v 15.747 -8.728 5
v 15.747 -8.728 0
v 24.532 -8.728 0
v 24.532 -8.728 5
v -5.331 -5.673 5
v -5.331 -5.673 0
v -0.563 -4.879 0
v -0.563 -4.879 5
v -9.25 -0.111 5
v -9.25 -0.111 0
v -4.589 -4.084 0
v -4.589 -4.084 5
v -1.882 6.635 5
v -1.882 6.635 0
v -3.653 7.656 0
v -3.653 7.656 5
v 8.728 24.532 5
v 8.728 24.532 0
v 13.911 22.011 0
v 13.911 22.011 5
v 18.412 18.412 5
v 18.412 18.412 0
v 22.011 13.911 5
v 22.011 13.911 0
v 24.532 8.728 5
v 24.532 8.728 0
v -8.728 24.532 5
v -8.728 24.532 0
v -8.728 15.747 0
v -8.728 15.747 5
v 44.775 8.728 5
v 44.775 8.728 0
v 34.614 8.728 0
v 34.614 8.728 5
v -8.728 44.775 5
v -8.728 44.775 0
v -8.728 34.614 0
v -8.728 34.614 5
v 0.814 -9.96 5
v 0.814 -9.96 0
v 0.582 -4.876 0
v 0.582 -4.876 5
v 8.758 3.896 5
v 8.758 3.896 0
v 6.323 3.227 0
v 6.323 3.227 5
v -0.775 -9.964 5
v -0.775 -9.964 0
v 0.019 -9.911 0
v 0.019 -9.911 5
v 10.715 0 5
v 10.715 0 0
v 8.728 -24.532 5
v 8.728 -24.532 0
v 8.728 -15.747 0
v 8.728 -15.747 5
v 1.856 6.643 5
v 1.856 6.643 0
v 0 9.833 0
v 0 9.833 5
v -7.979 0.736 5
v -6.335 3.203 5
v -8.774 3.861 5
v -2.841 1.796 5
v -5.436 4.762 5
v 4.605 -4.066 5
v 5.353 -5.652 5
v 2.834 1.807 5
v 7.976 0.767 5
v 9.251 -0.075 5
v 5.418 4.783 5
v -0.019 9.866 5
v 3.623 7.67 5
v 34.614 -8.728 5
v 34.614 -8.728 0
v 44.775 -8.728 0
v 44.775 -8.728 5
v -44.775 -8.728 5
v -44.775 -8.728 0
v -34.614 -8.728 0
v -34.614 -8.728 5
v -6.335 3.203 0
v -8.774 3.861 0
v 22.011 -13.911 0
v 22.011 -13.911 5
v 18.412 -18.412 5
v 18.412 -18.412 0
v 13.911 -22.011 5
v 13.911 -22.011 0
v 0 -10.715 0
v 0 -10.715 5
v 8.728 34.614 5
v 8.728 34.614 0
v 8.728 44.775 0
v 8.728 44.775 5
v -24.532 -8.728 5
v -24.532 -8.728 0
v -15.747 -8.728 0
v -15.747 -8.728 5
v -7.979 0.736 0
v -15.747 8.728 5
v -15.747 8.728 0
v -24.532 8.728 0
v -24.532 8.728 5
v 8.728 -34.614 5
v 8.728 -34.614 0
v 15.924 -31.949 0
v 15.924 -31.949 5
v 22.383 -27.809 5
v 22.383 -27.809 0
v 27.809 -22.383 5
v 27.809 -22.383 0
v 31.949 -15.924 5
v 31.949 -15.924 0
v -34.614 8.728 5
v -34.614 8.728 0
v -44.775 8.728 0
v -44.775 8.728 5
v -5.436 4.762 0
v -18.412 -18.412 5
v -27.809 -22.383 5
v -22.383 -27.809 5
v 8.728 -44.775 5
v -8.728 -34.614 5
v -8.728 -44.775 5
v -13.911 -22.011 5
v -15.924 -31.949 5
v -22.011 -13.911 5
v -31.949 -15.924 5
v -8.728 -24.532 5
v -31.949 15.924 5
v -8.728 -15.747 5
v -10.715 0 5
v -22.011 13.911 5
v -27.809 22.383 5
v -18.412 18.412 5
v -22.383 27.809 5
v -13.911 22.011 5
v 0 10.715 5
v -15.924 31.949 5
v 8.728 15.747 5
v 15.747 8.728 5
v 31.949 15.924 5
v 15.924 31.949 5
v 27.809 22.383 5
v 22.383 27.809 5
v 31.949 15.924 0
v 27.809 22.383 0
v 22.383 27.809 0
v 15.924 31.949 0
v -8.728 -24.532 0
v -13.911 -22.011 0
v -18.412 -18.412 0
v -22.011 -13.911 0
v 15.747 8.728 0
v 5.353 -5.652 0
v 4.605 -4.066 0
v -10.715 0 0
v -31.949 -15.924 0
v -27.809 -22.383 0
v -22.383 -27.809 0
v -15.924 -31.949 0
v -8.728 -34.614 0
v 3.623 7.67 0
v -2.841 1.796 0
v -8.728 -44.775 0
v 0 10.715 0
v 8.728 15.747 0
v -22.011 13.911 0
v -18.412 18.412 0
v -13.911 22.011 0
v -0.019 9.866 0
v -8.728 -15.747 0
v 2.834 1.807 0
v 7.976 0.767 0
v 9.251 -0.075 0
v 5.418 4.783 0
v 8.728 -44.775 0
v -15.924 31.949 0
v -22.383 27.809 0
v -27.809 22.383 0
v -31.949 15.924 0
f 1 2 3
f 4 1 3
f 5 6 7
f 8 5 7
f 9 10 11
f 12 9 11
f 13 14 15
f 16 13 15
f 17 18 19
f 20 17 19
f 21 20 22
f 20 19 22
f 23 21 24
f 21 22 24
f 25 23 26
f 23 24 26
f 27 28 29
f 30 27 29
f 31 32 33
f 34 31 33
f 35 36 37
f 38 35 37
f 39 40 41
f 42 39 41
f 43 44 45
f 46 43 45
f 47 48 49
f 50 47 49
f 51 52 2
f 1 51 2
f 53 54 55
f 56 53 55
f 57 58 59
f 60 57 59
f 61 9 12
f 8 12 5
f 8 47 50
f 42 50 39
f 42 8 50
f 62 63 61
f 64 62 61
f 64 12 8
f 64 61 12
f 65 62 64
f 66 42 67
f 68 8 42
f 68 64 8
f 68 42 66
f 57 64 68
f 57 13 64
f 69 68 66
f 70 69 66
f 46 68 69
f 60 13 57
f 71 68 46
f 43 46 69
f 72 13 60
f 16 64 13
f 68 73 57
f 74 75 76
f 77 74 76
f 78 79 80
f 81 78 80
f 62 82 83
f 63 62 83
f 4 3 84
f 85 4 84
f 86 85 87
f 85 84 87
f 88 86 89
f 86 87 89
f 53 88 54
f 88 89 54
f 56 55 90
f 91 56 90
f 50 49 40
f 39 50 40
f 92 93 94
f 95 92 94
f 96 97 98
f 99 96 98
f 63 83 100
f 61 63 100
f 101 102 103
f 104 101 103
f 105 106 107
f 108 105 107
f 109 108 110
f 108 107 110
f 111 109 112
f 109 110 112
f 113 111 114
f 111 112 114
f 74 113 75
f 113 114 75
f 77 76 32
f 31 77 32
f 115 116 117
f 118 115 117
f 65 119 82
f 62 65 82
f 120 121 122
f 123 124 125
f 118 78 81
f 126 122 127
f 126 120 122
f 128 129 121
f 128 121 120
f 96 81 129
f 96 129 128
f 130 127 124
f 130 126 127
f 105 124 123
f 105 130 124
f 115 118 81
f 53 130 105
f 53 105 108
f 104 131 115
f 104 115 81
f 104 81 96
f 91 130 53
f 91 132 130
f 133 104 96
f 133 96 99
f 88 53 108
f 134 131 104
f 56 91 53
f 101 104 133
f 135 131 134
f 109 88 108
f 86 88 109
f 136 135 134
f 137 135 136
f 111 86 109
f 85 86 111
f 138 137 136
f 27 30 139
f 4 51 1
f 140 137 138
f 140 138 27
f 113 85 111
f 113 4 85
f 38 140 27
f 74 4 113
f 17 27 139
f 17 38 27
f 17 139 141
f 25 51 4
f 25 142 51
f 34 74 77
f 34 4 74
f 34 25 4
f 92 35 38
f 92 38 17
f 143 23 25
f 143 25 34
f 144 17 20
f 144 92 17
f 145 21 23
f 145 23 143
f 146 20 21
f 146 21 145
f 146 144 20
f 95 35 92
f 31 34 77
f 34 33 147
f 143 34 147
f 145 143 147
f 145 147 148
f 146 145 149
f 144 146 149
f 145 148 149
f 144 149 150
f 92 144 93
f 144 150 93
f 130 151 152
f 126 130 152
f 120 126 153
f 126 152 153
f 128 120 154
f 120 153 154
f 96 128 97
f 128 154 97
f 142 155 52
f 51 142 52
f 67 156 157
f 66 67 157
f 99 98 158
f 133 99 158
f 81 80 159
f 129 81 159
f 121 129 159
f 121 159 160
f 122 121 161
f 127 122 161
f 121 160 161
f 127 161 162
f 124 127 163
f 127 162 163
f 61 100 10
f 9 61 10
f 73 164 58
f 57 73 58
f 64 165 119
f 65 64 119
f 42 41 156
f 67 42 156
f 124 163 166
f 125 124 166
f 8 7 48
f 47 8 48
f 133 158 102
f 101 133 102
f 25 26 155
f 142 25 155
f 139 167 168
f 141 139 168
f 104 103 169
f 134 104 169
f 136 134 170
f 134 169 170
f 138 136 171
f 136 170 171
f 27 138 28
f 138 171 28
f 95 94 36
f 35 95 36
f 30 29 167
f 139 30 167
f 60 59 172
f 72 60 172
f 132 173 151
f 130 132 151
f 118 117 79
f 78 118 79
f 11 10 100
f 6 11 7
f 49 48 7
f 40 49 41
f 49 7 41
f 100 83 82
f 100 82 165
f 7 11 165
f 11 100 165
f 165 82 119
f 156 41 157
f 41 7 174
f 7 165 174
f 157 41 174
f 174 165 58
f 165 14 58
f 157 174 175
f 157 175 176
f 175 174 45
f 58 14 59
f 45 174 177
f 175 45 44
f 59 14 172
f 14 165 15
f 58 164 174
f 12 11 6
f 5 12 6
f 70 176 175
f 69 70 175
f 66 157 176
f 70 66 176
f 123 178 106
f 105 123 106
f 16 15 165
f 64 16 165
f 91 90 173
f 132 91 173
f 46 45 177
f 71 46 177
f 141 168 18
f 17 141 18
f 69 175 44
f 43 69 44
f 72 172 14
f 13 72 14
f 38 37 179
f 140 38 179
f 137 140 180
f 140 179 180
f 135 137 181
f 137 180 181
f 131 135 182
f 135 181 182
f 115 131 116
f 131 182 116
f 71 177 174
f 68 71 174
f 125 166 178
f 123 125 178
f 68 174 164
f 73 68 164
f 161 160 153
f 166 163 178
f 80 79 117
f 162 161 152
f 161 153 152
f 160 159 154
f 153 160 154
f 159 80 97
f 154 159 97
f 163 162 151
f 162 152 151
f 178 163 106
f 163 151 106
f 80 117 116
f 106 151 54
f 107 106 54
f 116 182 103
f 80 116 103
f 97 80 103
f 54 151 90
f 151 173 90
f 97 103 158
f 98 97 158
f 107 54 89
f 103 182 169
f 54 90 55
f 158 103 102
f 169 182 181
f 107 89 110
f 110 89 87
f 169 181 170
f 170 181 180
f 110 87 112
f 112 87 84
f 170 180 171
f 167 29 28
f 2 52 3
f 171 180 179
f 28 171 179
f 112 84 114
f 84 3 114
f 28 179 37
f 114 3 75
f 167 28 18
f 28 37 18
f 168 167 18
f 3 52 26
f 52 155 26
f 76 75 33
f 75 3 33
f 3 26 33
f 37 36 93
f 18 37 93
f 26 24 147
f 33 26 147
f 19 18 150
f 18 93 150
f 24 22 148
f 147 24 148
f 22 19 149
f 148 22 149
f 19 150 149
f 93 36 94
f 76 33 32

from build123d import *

# Parameters (mm, degrees)
F1_DEPTH = 5


with BuildPart() as f1:
    # F0 (on Top) → F1 (new body)
    with BuildSketch(Plane.XY):
        with BuildLine():
            Line((-8.7284976617, 44.7745621204), (-8.7284976617, 34.6139920432))
            ThreePointArc((-8.7284976617, 34.6139920432), (-4.3977485861, 35.4256252446), (0, 35.6975505686))
            Line((0, 35.6975505686), (0, 44.7745621204))
            Line((0, 44.7745621204), (-8.7284976617, 44.7745621204))
        make_face()
        with BuildLine():
            Line((0, 44.7745621204), (0, 35.6975505686))
            ThreePointArc((0, 35.6975505686), (4.3977485861, 35.4256252446), (8.7284976617, 34.6139920432))
            Line((8.7284976617, 34.6139920432), (8.7284976617, 44.7745621204))
            Line((8.7284976617, 44.7745621204), (0, 44.7745621204))
        make_face()
        with BuildLine():
            ThreePointArc((8.7284976617, 34.6139920432), (4.3977485861, 35.4256252446), (0, 35.6975505686))
            Line((0, 35.6975505686), (0, 26.0385947902))
            ThreePointArc((0, 26.0385947902), (4.4287789528, 25.6591959273), (8.7284976616, 24.5320555033))
            Line((8.7284976617, 24.5320555033), (8.7284976617, 34.6139920432))
        make_face()
        with BuildLine():
            ThreePointArc((0, 35.6975505686), (-4.3977485861, 35.4256252446), (-8.7284976617, 34.6139920432))
            Line((-8.7284976617, 34.6139920432), (-8.7284976617, 24.5320555033))
            ThreePointArc((-8.7284976616, 24.5320555033), (-4.4287789528, 25.6591959273), (0, 26.0385947902))
            Line((0, 26.0385947902), (0, 35.6975505686))
        make_face()
        with BuildLine():
            ThreePointArc((0, 26.0385947902), (-4.4287789528, 25.6591959273), (-8.7284976616, 24.5320555033))
            Line((-8.7284976617, 24.5320555033), (-8.7284976617, 15.7472789288))
            Line((-8.7284976617, 15.7472789288), (0, 10.7151791453))
            Line((0, 10.7151791453), (0, 26.0385947902))
        make_face()
        with BuildLine():
            ThreePointArc((8.7284976616, 24.5320555033), (4.4287789528, 25.6591959273), (0, 26.0385947902))
            Line((0, 26.0385947902), (0, 10.7151791453))
            Line((0, 10.7151791453), (8.7284976617, 15.7472789288))
            Line((8.7284976617, 15.7472789288), (8.7284976617, 24.5320555033))
        make_face()
        with BuildLine():
            Line((15.7472789288, -8.7284976617), (24.5320555033, -8.7284976617))
            ThreePointArc((24.5320555033, -8.7284976617), (25.6591959273, -4.4287789528), (26.0385947902, 0))
            Line((26.0385947902, 0), (10.7151791453, 0))
            Line((10.7151791453, 0), (15.7472789288, -8.7284976617))
        make_face()
        with BuildLine():
            ThreePointArc((26.0385947902, 0), (25.6591959273, 4.4287789528), (24.5320555033, 8.7284976616))
            Line((24.5320555033, 8.7284976617), (15.7472789288, 8.7284976617))
            Line((15.7472789288, 8.7284976617), (10.7151791453, 0))
            Line((10.7151791453, 0), (26.0385947902, 0))
        make_face()
        with BuildLine():
            ThreePointArc((35.6975505686, 0), (35.4256252446, 4.3977485861), (34.6139920432, 8.7284976616))
            Line((34.6139920432, 8.7284976617), (24.5320555033, 8.7284976617))
            ThreePointArc((24.5320555033, 8.7284976616), (25.6591959273, 4.4287789528), (26.0385947902, 0))
            Line((26.0385947902, 0), (35.6975505686, 0))
        make_face()
        with BuildLine():
            Line((24.5320555033, -8.7284976617), (34.6139920432, -8.7284976617))
            ThreePointArc((34.6139920432, -8.7284976616), (35.4256252446, -4.3977485861), (35.6975505686, 0))
            Line((35.6975505686, 0), (26.0385947902, 0))
            ThreePointArc((26.0385947902, 0), (25.6591959273, -4.4287789528), (24.5320555033, -8.7284976617))
        make_face()
        with BuildLine():
            ThreePointArc((35.6975505686, 0), (35.4256252446, -4.3977485861), (34.6139920432, -8.7284976616))
            Line((34.6139920432, -8.7284976617), (44.7745621204, -8.7284976617))
            Line((44.7745621204, -8.7284976617), (44.7745621204, 0))
            Line((44.7745621204, 0), (35.6975505686, 0))
        make_face()
        with BuildLine():
            Line((44.7745621204, 8.7284976617), (34.6139920432, 8.7284976617))
            ThreePointArc((34.6139920432, 8.7284976616), (35.4256252446, 4.3977485861), (35.6975505686, 0))
            Line((35.6975505686, 0), (44.7745621204, 0))
            Line((44.7745621204, 0), (44.7745621204, 8.7284976617))
        make_face()
        with BuildLine():
            ThreePointArc((34.6139920432, 8.7284976616), (25.2419800788, 25.2419800788), (8.7284976617, 34.6139920432))
            Line((8.7284976617, 34.6139920432), (8.7284976617, 24.5320555033))
            ThreePointArc((8.7284976616, 24.5320555033), (18.4120669487, 18.4120669487), (24.5320555033, 8.7284976616))
            Line((24.5320555033, 8.7284976617), (34.6139920432, 8.7284976617))
        make_face()
        with BuildLine():
            ThreePointArc((-8.7284976617, 34.6139920432), (-25.2419800788, 25.2419800788), (-34.6139920432, 8.7284976616))
            Line((-34.6139920432, 8.7284976617), (-24.5320555033, 8.7284976617))
            ThreePointArc((-24.5320555033, 8.7284976616), (-18.4120669487, 18.4120669487), (-8.7284976616, 24.5320555033))
            Line((-8.7284976617, 24.5320555033), (-8.7284976617, 34.6139920432))
        make_face()
        with BuildLine():
            ThreePointArc((-34.6139920432, 8.7284976616), (-35.4256252446, 4.3977485861), (-35.6975505686, 0))
            Line((-35.6975505686, 0), (-26.0385947902, 0))
            ThreePointArc((-26.0385947902, 0), (-25.6591959273, 4.4287789528), (-24.5320555033, 8.7284976616))
            Line((-24.5320555033, 8.7284976617), (-34.6139920432, 8.7284976617))
        make_face()
        with BuildLine():
            ThreePointArc((-24.5320555033, 8.7284976616), (-25.6591959273, 4.4287789528), (-26.0385947902, 0))
            Line((-26.0385947902, 0), (-10.7151791453, 0))
            Line((-10.7151791453, 0), (-15.7472789288, 8.7284976617))
            Line((-15.7472789288, 8.7284976617), (-24.5320555033, 8.7284976617))
        make_face()
        with BuildLine():
            Line((-10.7151791453, 0), (-26.0385947902, 0))
            ThreePointArc((-26.0385947902, 0), (-25.6591959273, -4.4287789528), (-24.5320555033, -8.7284976616))
            Line((-24.5320555033, -8.7284976617), (-15.7472789288, -8.7284976617))
            Line((-15.7472789288, -8.7284976617), (-10.7151791453, 0))
        make_face()
        with BuildLine():
            Line((-26.0385947902, 0), (-35.6975505686, 0))
            ThreePointArc((-35.6975505686, 0), (-35.4256252446, -4.3977485861), (-34.6139920432, -8.7284976616))
            Line((-34.6139920432, -8.7284976617), (-24.5320555033, -8.7284976617))
            ThreePointArc((-24.5320555033, -8.7284976616), (-25.6591959273, -4.4287789528), (-26.0385947902, 0))
        make_face()
        with BuildLine():
            Line((-35.6975505686, 0), (-44.7745621204, 0))
            Line((-44.7745621204, 0), (-44.7745621204, -8.7284976617))
            Line((-44.7745621204, -8.7284976617), (-34.6139920432, -8.7284976617))
            ThreePointArc((-34.6139920432, -8.7284976616), (-35.4256252446, -4.3977485861), (-35.6975505686, 0))
        make_face()
        with BuildLine():
            Line((-44.7745621204, 8.7284976617), (-44.7745621204, 0))
            Line((-44.7745621204, 0), (-35.6975505686, 0))
            ThreePointArc((-35.6975505686, 0), (-35.4256252446, 4.3977485861), (-34.6139920432, 8.7284976616))
            Line((-34.6139920432, 8.7284976617), (-44.7745621204, 8.7284976617))
        make_face()
        with BuildLine():
            Line((-24.5320555033, -8.7284976617), (-34.6139920432, -8.7284976617))
            ThreePointArc((-34.6139920432, -8.7284976616), (-25.2419800788, -25.2419800788), (-8.7284976617, -34.6139920432))
            Line((-8.7284976617, -34.6139920432), (-8.7284976617, -24.5320555033))
            ThreePointArc((-8.7284976616, -24.5320555033), (-18.4120669487, -18.4120669487), (-24.5320555033, -8.7284976616))
        make_face()
        with BuildLine():
            Line((-8.7284976617, -24.5320555033), (-8.7284976617, -34.6139920432))
            ThreePointArc((-8.7284976617, -34.6139920432), (-4.3977485861, -35.4256252446), (0, -35.6975505686))
            Line((0, -35.6975505686), (0, -26.0385947902))
            ThreePointArc((0, -26.0385947902), (-4.4287789528, -25.6591959273), (-8.7284976616, -24.5320555033))
        make_face()
        with BuildLine():
            Line((-8.7284976617, -15.7472789288), (-8.7284976617, -24.5320555033))
            ThreePointArc((-8.7284976616, -24.5320555033), (-4.4287789528, -25.6591959273), (0, -26.0385947902))
            Line((0, -26.0385947902), (0, -10.7151791453))
            Line((0, -10.7151791453), (-8.7284976617, -15.7472789288))
        make_face()
        with BuildLine():
            Line((0, -10.7151791453), (0, -26.0385947902))
            ThreePointArc((0, -26.0385947902), (4.4287789528, -25.6591959273), (8.7284976616, -24.5320555033))
            Line((8.7284976617, -24.5320555033), (8.7284976617, -15.7472789288))
            Line((8.7284976617, -15.7472789288), (0, -10.7151791453))
        make_face()
        with BuildLine():
            Line((0, -26.0385947902), (0, -35.6975505686))
            ThreePointArc((0, -35.6975505686), (4.3977485861, -35.4256252446), (8.7284976617, -34.6139920432))
            Line((8.7284976617, -34.6139920432), (8.7284976617, -24.5320555033))
            ThreePointArc((8.7284976616, -24.5320555033), (4.4287789528, -25.6591959273), (0, -26.0385947902))
        make_face()
        with BuildLine():
            Line((8.7284976617, -24.5320555033), (8.7284976617, -34.6139920432))
            ThreePointArc((8.7284976617, -34.6139920432), (25.2419800788, -25.2419800788), (34.6139920432, -8.7284976616))
            Line((34.6139920432, -8.7284976617), (24.5320555033, -8.7284976617))
            ThreePointArc((24.5320555033, -8.7284976617), (18.4120669487, -18.4120669487), (8.7284976616, -24.5320555033))
        make_face()
        with BuildLine():
            ThreePointArc((8.7284976617, -34.6139920432), (4.3977485861, -35.4256252446), (0, -35.6975505686))
            Line((0, -35.6975505686), (0, -44.7745621204))
            Line((0, -44.7745621204), (8.7284976617, -44.7745621204))
            Line((8.7284976617, -44.7745621204), (8.7284976617, -34.6139920432))
        make_face()
        with BuildLine():
            ThreePointArc((0, -35.6975505686), (-4.3977485861, -35.4256252446), (-8.7284976617, -34.6139920432))
            Line((-8.7284976617, -34.6139920432), (-8.7284976617, -44.7745621204))
            Line((-8.7284976617, -44.7745621204), (0, -44.7745621204))
            Line((0, -44.7745621204), (0, -35.6975505686))
        make_face()
    extrude(amount=F1_DEPTH)


with BuildPart() as f1b:
    # F0 (on Top) → F1, piece 2 (new body)
    with BuildSketch(Plane.XY):
        Polygon((0.0193861542, -9.910623543), (0, 0), (0, 9.8333135078), (-0.019299824, 9.8664896445), (-1.8821764336, 6.6352114842), (-3.652818574, 7.6560111999), (-2.8409659863, 1.7956340453), (-5.4364711978, 4.7619254328), (-6.3354833617, 3.2025315598), (-8.7735494599, 3.8614440709), (-7.9790065065, 0.7362440811), (-9.2502748594, -0.1112677855), (-4.588959273, -4.0839798748), (-5.3305323236, -5.6730648503), (-0.5632776883, -4.8785223626), (-0.7751554949, -9.9635934457), align=None)
        Polygon((0, 9.8333135078), (0, 0), (0.0193861542, -9.910623543), (0.814128951, -9.9604846491), (0.5823590437, -4.8762813845), (5.3526855916, -5.6521674255), (4.6049014268, -4.0659957792), (9.2506393704, -0.075078178), (7.9760651256, 0.7674537701), (8.7583756485, 3.8957382405), (6.3229059933, 3.2272926142), (5.417800077, 4.7831574548), (2.8339193988, 1.8067346791), (3.6228389134, 7.6702431014), (1.856203877, 6.6425241237), align=None)
    extrude(amount=F1_DEPTH)


solid = Compound([f1.part, f1b.part])
